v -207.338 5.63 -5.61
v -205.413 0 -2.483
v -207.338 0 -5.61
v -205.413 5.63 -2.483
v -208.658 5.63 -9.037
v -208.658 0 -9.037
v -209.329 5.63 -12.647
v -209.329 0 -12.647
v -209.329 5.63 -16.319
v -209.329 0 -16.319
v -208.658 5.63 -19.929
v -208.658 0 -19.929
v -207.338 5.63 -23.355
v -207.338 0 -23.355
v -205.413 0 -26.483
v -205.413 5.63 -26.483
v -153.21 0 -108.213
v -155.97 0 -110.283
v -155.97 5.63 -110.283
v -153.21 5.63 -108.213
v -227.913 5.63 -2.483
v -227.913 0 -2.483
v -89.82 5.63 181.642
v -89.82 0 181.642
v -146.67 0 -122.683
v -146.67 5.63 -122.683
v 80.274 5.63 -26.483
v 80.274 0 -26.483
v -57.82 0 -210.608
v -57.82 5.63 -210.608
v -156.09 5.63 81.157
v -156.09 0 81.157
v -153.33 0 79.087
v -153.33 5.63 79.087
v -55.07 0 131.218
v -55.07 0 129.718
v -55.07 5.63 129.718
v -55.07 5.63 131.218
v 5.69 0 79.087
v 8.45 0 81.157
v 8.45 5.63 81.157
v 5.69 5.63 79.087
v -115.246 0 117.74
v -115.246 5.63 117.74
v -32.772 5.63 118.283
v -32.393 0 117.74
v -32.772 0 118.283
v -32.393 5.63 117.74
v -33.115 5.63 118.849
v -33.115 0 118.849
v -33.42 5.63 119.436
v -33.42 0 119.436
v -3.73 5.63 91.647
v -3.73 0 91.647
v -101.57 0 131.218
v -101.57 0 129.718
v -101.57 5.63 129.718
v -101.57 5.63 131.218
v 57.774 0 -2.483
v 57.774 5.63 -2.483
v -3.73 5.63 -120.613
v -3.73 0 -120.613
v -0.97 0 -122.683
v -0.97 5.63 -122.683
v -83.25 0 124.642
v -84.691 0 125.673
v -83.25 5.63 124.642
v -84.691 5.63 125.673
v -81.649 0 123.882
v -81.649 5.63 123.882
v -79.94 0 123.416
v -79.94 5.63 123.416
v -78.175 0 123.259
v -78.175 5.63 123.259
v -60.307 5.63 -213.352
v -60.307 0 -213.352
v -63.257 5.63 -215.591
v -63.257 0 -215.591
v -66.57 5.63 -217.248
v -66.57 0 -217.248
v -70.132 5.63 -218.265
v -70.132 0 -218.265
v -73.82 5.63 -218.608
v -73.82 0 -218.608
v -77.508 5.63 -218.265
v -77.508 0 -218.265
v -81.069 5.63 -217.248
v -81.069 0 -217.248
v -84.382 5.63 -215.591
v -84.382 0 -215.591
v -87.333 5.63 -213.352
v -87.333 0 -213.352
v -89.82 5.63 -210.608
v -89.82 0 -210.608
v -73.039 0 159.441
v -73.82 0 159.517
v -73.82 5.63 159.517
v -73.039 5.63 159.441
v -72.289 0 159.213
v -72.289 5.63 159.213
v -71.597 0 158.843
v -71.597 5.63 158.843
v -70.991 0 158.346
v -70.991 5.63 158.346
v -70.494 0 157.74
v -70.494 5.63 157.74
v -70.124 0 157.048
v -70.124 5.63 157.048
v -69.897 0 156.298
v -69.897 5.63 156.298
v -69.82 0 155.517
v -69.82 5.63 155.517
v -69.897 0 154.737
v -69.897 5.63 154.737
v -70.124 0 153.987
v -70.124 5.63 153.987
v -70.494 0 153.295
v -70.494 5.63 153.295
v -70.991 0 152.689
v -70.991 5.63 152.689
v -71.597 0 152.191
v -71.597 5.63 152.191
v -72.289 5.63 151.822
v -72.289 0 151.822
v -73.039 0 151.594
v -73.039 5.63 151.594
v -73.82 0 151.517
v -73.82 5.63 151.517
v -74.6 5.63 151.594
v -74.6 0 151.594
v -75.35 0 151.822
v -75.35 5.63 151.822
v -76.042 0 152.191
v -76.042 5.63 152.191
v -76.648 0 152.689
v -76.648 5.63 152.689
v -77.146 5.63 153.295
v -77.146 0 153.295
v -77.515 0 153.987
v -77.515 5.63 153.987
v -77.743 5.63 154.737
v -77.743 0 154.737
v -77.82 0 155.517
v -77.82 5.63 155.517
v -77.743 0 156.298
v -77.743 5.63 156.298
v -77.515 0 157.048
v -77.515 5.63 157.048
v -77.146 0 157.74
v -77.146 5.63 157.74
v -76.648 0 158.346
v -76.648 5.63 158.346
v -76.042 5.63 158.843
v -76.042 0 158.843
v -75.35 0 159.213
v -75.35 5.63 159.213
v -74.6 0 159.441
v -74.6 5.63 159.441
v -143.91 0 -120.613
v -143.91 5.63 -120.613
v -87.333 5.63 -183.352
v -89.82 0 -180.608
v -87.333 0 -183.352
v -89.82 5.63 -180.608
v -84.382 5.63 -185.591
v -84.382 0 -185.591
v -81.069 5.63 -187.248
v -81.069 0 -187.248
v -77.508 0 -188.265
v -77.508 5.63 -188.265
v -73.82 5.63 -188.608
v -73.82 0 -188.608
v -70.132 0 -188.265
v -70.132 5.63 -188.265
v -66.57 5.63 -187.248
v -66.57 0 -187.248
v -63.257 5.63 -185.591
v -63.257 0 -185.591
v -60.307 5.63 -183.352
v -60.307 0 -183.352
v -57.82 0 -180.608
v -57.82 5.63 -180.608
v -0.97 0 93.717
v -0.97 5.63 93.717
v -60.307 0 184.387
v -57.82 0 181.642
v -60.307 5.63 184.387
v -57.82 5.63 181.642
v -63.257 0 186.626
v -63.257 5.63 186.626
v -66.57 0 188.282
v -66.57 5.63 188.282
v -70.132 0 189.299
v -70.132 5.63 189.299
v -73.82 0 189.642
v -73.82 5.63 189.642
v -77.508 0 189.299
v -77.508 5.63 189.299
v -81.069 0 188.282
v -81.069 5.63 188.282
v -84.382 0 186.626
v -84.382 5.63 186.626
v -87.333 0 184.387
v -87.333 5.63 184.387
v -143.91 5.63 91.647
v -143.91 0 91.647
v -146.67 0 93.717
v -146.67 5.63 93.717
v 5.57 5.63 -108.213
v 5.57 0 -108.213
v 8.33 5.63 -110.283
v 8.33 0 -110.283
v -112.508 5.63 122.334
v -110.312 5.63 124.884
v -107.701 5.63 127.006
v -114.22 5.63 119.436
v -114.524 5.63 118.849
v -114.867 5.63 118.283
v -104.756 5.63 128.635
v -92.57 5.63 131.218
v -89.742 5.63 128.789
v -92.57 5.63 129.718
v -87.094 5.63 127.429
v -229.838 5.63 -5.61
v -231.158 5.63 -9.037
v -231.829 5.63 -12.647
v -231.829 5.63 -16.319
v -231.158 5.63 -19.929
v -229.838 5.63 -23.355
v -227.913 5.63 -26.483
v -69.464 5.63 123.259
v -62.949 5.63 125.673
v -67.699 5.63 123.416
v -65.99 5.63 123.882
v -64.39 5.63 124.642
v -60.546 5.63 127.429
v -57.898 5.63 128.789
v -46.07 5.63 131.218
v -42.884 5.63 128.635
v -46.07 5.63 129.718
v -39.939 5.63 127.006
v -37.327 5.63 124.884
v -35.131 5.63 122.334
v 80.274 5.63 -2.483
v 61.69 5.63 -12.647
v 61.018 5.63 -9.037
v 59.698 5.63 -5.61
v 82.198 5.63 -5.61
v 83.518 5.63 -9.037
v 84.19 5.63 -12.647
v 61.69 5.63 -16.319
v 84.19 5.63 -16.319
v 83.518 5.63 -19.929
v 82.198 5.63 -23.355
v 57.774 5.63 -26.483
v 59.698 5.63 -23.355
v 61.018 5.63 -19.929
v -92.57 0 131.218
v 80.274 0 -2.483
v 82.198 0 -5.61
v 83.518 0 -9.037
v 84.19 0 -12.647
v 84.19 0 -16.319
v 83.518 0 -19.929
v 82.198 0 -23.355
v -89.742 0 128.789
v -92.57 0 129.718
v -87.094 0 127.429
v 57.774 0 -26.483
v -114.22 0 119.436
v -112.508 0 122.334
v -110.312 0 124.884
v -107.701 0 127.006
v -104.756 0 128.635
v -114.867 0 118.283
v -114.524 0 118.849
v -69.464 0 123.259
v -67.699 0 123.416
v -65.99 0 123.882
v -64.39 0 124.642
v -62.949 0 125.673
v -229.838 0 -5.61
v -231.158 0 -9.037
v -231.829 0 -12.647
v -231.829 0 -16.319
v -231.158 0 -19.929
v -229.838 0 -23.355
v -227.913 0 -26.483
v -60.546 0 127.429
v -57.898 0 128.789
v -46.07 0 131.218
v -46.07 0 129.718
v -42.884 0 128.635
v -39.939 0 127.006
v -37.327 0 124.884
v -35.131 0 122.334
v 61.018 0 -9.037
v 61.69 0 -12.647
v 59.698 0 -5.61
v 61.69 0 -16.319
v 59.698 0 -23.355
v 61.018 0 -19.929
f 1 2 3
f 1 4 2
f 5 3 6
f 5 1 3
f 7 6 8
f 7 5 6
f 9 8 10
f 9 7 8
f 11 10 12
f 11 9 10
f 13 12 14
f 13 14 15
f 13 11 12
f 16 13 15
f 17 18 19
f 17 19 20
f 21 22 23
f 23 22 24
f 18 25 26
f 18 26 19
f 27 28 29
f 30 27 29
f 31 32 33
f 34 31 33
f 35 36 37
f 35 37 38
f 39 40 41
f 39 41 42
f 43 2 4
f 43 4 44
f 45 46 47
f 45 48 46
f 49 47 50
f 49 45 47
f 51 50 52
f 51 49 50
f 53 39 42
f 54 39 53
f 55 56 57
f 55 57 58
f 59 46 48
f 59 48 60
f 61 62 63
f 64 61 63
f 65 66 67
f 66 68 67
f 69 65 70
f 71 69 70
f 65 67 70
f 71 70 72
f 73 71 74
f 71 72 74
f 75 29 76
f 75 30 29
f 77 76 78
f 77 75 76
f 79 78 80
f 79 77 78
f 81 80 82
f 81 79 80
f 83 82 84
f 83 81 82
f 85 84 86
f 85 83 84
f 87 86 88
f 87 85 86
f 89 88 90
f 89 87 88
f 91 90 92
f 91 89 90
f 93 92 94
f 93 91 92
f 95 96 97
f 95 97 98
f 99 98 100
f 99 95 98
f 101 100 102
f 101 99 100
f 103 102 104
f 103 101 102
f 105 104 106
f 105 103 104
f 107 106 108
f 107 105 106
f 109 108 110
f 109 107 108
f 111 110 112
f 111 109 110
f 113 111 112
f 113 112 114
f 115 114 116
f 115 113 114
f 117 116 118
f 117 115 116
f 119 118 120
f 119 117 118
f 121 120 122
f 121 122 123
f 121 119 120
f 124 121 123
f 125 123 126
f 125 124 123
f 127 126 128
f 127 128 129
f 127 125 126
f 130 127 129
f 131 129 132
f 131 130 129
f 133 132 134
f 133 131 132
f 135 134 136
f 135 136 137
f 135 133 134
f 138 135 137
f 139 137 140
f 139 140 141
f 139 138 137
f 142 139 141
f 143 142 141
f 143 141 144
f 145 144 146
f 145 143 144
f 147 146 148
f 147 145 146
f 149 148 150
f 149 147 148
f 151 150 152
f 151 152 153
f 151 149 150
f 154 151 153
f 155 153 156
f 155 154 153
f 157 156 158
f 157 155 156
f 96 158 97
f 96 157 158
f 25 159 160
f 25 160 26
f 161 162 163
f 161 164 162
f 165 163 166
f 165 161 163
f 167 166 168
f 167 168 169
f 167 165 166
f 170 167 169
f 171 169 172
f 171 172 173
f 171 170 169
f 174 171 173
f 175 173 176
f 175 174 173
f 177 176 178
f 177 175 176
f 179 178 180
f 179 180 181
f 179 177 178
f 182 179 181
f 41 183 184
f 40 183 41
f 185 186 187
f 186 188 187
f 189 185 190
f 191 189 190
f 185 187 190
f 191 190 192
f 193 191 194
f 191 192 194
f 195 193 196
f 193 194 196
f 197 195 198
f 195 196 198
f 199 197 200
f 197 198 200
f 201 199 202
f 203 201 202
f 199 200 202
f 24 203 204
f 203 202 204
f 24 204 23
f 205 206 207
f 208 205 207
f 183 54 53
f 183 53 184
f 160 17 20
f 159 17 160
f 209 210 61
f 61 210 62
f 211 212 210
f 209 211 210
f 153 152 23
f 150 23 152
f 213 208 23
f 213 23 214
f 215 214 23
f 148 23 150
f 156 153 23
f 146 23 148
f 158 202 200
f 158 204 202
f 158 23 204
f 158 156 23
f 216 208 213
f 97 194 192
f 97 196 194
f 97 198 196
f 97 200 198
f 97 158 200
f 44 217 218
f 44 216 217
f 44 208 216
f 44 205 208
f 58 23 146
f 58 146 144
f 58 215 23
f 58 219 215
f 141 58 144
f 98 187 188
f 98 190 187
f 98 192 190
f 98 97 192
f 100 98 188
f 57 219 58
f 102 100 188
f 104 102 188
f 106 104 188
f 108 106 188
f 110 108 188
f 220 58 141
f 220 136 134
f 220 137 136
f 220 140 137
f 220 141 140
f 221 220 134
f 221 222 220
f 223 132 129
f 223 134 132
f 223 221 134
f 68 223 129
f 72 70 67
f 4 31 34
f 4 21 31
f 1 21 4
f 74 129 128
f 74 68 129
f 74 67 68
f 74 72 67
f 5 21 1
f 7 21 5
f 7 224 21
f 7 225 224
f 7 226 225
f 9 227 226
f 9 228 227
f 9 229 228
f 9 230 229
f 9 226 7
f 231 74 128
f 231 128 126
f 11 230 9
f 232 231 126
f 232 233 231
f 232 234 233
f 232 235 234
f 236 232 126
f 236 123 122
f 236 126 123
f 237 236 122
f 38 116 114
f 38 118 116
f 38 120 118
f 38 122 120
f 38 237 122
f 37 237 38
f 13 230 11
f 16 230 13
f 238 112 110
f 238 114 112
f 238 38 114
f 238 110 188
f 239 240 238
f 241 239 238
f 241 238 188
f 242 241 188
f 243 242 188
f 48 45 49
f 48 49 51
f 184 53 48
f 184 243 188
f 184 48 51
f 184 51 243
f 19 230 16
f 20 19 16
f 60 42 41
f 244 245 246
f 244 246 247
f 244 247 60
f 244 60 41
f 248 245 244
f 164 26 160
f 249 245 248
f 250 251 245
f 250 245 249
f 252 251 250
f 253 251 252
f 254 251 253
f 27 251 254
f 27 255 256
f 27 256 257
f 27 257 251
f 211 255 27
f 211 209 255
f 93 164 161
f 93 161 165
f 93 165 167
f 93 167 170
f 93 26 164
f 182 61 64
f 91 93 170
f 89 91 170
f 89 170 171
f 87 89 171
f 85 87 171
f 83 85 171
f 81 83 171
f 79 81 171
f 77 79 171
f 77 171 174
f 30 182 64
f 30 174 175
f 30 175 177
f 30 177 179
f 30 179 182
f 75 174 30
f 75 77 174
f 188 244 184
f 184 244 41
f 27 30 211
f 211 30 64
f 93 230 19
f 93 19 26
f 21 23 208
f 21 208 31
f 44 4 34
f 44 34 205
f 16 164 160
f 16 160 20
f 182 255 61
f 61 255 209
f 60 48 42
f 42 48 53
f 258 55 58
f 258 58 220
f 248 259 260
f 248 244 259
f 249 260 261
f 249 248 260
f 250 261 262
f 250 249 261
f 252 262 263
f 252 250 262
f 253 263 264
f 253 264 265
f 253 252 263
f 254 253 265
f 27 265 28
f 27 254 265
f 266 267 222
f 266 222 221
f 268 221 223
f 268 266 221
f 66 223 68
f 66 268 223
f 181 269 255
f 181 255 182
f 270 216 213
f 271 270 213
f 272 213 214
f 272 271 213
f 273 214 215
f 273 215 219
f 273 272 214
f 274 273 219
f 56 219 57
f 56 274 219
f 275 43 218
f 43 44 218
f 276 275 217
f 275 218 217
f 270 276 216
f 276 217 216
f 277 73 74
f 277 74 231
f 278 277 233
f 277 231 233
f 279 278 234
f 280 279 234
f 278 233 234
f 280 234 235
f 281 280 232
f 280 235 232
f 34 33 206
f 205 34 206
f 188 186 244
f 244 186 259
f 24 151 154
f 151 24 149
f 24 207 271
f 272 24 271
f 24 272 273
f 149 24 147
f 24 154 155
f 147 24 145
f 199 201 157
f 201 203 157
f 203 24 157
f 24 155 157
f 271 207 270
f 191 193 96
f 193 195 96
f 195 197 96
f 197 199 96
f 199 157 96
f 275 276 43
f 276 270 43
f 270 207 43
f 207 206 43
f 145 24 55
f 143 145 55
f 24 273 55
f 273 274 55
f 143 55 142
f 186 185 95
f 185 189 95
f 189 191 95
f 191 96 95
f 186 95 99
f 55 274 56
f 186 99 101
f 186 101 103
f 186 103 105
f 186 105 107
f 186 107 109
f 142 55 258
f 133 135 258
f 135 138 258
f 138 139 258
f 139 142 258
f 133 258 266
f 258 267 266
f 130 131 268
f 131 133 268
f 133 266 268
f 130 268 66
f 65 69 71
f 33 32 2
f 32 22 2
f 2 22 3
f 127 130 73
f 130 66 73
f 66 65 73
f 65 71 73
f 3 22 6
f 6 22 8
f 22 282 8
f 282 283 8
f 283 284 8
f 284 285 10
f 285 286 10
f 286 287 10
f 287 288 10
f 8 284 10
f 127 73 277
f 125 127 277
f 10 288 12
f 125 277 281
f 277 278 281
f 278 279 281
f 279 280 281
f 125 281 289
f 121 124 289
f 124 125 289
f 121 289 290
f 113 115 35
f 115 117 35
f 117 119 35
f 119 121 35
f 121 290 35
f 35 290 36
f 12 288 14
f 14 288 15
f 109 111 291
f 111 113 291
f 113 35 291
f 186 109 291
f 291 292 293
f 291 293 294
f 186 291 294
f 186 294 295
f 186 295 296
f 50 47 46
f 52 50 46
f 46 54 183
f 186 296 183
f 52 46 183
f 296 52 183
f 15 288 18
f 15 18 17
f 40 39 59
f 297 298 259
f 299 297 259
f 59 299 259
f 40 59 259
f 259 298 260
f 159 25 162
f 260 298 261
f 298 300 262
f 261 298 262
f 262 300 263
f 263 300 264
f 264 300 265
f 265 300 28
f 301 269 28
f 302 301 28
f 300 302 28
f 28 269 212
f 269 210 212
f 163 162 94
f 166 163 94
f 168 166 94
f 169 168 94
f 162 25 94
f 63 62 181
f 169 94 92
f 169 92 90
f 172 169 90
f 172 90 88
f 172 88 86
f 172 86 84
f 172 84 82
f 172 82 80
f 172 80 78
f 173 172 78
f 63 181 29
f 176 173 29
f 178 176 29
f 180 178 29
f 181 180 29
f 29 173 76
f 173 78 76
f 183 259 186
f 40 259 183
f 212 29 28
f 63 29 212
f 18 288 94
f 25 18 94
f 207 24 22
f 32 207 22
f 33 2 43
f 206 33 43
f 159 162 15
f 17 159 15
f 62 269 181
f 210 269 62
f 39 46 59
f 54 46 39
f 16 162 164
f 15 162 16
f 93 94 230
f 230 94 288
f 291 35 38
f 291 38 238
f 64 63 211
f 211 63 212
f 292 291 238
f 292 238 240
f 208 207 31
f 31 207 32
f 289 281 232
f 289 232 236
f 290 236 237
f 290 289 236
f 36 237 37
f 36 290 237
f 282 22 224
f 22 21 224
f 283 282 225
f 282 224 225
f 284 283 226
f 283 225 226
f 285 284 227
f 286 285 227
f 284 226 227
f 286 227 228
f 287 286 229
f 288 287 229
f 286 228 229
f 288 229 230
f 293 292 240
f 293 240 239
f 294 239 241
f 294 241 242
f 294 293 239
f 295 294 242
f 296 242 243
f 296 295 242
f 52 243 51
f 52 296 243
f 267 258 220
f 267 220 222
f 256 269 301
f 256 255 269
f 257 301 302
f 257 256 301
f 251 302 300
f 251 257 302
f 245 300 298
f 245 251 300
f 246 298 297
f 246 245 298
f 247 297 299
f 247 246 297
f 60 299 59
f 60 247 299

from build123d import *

# Parameters (mm, degrees)
SKETCH1_R           = 4
BOSS_EXTRUDE1_DEPTH = 5.63
FILLET1_R           = 20
FILLET2_R           = 20
FILLET3_R           = 10


with BuildPart() as part:
    # Sketch1 → Boss-Extrude1 (new body)
    with BuildSketch(Plane(origin=(0, 0, 0), x_dir=(1, 0, 0), z_dir=(0, 1, 0))):
        Polygon((-73.819651424, -202.975693425), (89.274098576, 14.482639908), (-73.819651424, 231.940973242), (-236.913401424, 14.482639908), align=None)
        with Locations(Location((-73.819651424, -155.517360092, 0), (0, 0, 270))):
            Circle(SKETCH1_R, mode=Mode.SUBTRACT)
        with BuildLine():
            Line((-214.413401424, 14.482639908), (-114.584807136, -118.622152475))
            ThreePointArc((-114.584807136, -118.622152475), (-109.396341366, -125.717430875), (-101.569651424, -129.718190449))
            Line((-101.569651424, -129.718190449), (-101.569651424, -131.218190449))
            Line((-101.569651424, -131.218190449), (-92.569651424, -131.218190449))
            Line((-92.569651424, -131.218190449), (-92.569651424, -129.718190449))
            ThreePointArc((-92.569651424, -129.718190449), (-86.926275258, -127.32463745), (-82.338731561, -123.258775507))
            Line((-82.338731561, -123.258775507), (-65.300571287, -123.258775507))
            ThreePointArc((-65.300571287, -123.258775507), (-60.71302759, -127.32463745), (-55.069651424, -129.718190449))
            Line((-55.069651424, -129.718190449), (-55.069651424, -131.218190449))
            Line((-55.069651424, -131.218190449), (-46.069651424, -131.218190449))
            Line((-46.069651424, -131.218190449), (-46.069651424, -129.718190449))
            ThreePointArc((-46.069651424, -129.718190449), (-38.242961482, -125.717430875), (-33.054495712, -118.622152475))
            Line((-33.054495712, -118.622152475), (66.774098576, 14.482639908))
            Line((66.774098576, 14.482639908), (-73.819651424, 201.940973242))
            Line((-73.819651424, 201.940973242), (-214.413401424, 14.482639908))
        make_face(mode=Mode.SUBTRACT)
        Polygon((-156.089651424, -81.157360092), (-153.329651424, -79.087360092), (-143.909651424, -91.647360092), (-146.669651424, -93.717360092), align=None, mode=Mode.SUBTRACT)
        Polygon((8.450348576, -81.157360092), (5.690348576, -79.087360092), (-3.729651424, -91.647360092), (-0.969651424, -93.717360092), align=None, mode=Mode.SUBTRACT)
        Polygon((-146.669651424, 122.682639908), (-155.969651424, 110.282639908), (-153.209651424, 108.212639908), (-143.909651424, 120.612639908), align=None, mode=Mode.SUBTRACT)
        Polygon((-0.969651424, 122.682639908), (8.330348576, 110.282639908), (5.570348576, 108.212639908), (-3.729651424, 120.612639908), align=None, mode=Mode.SUBTRACT)
    extrude(amount=BOSS_EXTRUDE1_DEPTH)

    # Fillet1
    fillet1_edges = [part.edges().sort_by_distance(p)[0] for p in [
        (89.274098576, 2.815, -14.482639908),
        (-73.819651424, 2.815, 202.975693425),
        (-236.913401424, 2.815, -14.482639908),
        (-73.819651424, 2.815, -231.940973242),
    ]]
    fillet(fillet1_edges, radius=FILLET1_R)

    # Fillet2
    fillet2_edges = [part.edges().sort_by_distance(p)[0] for p in [
        (66.774098576, 2.815, -14.482639908),
        (-73.819651424, 2.815, -201.940973242),
        (-214.413401424, 2.815, -14.482639908),
    ]]
    fillet(fillet2_edges, radius=FILLET2_R)

    # Fillet3
    fillet3_edges = [part.edges().sort_by_distance(p)[0] for p in [
        (-114.584807136, 2.815, 118.622152475),
        (-82.338731561, 2.815, 123.258775507),
        (-65.300571287, 2.815, 123.258775507),
        (-33.054495712, 2.815, 118.622152475),
    ]]
    fillet(fillet3_edges, radius=FILLET3_R)


solid = part.part
